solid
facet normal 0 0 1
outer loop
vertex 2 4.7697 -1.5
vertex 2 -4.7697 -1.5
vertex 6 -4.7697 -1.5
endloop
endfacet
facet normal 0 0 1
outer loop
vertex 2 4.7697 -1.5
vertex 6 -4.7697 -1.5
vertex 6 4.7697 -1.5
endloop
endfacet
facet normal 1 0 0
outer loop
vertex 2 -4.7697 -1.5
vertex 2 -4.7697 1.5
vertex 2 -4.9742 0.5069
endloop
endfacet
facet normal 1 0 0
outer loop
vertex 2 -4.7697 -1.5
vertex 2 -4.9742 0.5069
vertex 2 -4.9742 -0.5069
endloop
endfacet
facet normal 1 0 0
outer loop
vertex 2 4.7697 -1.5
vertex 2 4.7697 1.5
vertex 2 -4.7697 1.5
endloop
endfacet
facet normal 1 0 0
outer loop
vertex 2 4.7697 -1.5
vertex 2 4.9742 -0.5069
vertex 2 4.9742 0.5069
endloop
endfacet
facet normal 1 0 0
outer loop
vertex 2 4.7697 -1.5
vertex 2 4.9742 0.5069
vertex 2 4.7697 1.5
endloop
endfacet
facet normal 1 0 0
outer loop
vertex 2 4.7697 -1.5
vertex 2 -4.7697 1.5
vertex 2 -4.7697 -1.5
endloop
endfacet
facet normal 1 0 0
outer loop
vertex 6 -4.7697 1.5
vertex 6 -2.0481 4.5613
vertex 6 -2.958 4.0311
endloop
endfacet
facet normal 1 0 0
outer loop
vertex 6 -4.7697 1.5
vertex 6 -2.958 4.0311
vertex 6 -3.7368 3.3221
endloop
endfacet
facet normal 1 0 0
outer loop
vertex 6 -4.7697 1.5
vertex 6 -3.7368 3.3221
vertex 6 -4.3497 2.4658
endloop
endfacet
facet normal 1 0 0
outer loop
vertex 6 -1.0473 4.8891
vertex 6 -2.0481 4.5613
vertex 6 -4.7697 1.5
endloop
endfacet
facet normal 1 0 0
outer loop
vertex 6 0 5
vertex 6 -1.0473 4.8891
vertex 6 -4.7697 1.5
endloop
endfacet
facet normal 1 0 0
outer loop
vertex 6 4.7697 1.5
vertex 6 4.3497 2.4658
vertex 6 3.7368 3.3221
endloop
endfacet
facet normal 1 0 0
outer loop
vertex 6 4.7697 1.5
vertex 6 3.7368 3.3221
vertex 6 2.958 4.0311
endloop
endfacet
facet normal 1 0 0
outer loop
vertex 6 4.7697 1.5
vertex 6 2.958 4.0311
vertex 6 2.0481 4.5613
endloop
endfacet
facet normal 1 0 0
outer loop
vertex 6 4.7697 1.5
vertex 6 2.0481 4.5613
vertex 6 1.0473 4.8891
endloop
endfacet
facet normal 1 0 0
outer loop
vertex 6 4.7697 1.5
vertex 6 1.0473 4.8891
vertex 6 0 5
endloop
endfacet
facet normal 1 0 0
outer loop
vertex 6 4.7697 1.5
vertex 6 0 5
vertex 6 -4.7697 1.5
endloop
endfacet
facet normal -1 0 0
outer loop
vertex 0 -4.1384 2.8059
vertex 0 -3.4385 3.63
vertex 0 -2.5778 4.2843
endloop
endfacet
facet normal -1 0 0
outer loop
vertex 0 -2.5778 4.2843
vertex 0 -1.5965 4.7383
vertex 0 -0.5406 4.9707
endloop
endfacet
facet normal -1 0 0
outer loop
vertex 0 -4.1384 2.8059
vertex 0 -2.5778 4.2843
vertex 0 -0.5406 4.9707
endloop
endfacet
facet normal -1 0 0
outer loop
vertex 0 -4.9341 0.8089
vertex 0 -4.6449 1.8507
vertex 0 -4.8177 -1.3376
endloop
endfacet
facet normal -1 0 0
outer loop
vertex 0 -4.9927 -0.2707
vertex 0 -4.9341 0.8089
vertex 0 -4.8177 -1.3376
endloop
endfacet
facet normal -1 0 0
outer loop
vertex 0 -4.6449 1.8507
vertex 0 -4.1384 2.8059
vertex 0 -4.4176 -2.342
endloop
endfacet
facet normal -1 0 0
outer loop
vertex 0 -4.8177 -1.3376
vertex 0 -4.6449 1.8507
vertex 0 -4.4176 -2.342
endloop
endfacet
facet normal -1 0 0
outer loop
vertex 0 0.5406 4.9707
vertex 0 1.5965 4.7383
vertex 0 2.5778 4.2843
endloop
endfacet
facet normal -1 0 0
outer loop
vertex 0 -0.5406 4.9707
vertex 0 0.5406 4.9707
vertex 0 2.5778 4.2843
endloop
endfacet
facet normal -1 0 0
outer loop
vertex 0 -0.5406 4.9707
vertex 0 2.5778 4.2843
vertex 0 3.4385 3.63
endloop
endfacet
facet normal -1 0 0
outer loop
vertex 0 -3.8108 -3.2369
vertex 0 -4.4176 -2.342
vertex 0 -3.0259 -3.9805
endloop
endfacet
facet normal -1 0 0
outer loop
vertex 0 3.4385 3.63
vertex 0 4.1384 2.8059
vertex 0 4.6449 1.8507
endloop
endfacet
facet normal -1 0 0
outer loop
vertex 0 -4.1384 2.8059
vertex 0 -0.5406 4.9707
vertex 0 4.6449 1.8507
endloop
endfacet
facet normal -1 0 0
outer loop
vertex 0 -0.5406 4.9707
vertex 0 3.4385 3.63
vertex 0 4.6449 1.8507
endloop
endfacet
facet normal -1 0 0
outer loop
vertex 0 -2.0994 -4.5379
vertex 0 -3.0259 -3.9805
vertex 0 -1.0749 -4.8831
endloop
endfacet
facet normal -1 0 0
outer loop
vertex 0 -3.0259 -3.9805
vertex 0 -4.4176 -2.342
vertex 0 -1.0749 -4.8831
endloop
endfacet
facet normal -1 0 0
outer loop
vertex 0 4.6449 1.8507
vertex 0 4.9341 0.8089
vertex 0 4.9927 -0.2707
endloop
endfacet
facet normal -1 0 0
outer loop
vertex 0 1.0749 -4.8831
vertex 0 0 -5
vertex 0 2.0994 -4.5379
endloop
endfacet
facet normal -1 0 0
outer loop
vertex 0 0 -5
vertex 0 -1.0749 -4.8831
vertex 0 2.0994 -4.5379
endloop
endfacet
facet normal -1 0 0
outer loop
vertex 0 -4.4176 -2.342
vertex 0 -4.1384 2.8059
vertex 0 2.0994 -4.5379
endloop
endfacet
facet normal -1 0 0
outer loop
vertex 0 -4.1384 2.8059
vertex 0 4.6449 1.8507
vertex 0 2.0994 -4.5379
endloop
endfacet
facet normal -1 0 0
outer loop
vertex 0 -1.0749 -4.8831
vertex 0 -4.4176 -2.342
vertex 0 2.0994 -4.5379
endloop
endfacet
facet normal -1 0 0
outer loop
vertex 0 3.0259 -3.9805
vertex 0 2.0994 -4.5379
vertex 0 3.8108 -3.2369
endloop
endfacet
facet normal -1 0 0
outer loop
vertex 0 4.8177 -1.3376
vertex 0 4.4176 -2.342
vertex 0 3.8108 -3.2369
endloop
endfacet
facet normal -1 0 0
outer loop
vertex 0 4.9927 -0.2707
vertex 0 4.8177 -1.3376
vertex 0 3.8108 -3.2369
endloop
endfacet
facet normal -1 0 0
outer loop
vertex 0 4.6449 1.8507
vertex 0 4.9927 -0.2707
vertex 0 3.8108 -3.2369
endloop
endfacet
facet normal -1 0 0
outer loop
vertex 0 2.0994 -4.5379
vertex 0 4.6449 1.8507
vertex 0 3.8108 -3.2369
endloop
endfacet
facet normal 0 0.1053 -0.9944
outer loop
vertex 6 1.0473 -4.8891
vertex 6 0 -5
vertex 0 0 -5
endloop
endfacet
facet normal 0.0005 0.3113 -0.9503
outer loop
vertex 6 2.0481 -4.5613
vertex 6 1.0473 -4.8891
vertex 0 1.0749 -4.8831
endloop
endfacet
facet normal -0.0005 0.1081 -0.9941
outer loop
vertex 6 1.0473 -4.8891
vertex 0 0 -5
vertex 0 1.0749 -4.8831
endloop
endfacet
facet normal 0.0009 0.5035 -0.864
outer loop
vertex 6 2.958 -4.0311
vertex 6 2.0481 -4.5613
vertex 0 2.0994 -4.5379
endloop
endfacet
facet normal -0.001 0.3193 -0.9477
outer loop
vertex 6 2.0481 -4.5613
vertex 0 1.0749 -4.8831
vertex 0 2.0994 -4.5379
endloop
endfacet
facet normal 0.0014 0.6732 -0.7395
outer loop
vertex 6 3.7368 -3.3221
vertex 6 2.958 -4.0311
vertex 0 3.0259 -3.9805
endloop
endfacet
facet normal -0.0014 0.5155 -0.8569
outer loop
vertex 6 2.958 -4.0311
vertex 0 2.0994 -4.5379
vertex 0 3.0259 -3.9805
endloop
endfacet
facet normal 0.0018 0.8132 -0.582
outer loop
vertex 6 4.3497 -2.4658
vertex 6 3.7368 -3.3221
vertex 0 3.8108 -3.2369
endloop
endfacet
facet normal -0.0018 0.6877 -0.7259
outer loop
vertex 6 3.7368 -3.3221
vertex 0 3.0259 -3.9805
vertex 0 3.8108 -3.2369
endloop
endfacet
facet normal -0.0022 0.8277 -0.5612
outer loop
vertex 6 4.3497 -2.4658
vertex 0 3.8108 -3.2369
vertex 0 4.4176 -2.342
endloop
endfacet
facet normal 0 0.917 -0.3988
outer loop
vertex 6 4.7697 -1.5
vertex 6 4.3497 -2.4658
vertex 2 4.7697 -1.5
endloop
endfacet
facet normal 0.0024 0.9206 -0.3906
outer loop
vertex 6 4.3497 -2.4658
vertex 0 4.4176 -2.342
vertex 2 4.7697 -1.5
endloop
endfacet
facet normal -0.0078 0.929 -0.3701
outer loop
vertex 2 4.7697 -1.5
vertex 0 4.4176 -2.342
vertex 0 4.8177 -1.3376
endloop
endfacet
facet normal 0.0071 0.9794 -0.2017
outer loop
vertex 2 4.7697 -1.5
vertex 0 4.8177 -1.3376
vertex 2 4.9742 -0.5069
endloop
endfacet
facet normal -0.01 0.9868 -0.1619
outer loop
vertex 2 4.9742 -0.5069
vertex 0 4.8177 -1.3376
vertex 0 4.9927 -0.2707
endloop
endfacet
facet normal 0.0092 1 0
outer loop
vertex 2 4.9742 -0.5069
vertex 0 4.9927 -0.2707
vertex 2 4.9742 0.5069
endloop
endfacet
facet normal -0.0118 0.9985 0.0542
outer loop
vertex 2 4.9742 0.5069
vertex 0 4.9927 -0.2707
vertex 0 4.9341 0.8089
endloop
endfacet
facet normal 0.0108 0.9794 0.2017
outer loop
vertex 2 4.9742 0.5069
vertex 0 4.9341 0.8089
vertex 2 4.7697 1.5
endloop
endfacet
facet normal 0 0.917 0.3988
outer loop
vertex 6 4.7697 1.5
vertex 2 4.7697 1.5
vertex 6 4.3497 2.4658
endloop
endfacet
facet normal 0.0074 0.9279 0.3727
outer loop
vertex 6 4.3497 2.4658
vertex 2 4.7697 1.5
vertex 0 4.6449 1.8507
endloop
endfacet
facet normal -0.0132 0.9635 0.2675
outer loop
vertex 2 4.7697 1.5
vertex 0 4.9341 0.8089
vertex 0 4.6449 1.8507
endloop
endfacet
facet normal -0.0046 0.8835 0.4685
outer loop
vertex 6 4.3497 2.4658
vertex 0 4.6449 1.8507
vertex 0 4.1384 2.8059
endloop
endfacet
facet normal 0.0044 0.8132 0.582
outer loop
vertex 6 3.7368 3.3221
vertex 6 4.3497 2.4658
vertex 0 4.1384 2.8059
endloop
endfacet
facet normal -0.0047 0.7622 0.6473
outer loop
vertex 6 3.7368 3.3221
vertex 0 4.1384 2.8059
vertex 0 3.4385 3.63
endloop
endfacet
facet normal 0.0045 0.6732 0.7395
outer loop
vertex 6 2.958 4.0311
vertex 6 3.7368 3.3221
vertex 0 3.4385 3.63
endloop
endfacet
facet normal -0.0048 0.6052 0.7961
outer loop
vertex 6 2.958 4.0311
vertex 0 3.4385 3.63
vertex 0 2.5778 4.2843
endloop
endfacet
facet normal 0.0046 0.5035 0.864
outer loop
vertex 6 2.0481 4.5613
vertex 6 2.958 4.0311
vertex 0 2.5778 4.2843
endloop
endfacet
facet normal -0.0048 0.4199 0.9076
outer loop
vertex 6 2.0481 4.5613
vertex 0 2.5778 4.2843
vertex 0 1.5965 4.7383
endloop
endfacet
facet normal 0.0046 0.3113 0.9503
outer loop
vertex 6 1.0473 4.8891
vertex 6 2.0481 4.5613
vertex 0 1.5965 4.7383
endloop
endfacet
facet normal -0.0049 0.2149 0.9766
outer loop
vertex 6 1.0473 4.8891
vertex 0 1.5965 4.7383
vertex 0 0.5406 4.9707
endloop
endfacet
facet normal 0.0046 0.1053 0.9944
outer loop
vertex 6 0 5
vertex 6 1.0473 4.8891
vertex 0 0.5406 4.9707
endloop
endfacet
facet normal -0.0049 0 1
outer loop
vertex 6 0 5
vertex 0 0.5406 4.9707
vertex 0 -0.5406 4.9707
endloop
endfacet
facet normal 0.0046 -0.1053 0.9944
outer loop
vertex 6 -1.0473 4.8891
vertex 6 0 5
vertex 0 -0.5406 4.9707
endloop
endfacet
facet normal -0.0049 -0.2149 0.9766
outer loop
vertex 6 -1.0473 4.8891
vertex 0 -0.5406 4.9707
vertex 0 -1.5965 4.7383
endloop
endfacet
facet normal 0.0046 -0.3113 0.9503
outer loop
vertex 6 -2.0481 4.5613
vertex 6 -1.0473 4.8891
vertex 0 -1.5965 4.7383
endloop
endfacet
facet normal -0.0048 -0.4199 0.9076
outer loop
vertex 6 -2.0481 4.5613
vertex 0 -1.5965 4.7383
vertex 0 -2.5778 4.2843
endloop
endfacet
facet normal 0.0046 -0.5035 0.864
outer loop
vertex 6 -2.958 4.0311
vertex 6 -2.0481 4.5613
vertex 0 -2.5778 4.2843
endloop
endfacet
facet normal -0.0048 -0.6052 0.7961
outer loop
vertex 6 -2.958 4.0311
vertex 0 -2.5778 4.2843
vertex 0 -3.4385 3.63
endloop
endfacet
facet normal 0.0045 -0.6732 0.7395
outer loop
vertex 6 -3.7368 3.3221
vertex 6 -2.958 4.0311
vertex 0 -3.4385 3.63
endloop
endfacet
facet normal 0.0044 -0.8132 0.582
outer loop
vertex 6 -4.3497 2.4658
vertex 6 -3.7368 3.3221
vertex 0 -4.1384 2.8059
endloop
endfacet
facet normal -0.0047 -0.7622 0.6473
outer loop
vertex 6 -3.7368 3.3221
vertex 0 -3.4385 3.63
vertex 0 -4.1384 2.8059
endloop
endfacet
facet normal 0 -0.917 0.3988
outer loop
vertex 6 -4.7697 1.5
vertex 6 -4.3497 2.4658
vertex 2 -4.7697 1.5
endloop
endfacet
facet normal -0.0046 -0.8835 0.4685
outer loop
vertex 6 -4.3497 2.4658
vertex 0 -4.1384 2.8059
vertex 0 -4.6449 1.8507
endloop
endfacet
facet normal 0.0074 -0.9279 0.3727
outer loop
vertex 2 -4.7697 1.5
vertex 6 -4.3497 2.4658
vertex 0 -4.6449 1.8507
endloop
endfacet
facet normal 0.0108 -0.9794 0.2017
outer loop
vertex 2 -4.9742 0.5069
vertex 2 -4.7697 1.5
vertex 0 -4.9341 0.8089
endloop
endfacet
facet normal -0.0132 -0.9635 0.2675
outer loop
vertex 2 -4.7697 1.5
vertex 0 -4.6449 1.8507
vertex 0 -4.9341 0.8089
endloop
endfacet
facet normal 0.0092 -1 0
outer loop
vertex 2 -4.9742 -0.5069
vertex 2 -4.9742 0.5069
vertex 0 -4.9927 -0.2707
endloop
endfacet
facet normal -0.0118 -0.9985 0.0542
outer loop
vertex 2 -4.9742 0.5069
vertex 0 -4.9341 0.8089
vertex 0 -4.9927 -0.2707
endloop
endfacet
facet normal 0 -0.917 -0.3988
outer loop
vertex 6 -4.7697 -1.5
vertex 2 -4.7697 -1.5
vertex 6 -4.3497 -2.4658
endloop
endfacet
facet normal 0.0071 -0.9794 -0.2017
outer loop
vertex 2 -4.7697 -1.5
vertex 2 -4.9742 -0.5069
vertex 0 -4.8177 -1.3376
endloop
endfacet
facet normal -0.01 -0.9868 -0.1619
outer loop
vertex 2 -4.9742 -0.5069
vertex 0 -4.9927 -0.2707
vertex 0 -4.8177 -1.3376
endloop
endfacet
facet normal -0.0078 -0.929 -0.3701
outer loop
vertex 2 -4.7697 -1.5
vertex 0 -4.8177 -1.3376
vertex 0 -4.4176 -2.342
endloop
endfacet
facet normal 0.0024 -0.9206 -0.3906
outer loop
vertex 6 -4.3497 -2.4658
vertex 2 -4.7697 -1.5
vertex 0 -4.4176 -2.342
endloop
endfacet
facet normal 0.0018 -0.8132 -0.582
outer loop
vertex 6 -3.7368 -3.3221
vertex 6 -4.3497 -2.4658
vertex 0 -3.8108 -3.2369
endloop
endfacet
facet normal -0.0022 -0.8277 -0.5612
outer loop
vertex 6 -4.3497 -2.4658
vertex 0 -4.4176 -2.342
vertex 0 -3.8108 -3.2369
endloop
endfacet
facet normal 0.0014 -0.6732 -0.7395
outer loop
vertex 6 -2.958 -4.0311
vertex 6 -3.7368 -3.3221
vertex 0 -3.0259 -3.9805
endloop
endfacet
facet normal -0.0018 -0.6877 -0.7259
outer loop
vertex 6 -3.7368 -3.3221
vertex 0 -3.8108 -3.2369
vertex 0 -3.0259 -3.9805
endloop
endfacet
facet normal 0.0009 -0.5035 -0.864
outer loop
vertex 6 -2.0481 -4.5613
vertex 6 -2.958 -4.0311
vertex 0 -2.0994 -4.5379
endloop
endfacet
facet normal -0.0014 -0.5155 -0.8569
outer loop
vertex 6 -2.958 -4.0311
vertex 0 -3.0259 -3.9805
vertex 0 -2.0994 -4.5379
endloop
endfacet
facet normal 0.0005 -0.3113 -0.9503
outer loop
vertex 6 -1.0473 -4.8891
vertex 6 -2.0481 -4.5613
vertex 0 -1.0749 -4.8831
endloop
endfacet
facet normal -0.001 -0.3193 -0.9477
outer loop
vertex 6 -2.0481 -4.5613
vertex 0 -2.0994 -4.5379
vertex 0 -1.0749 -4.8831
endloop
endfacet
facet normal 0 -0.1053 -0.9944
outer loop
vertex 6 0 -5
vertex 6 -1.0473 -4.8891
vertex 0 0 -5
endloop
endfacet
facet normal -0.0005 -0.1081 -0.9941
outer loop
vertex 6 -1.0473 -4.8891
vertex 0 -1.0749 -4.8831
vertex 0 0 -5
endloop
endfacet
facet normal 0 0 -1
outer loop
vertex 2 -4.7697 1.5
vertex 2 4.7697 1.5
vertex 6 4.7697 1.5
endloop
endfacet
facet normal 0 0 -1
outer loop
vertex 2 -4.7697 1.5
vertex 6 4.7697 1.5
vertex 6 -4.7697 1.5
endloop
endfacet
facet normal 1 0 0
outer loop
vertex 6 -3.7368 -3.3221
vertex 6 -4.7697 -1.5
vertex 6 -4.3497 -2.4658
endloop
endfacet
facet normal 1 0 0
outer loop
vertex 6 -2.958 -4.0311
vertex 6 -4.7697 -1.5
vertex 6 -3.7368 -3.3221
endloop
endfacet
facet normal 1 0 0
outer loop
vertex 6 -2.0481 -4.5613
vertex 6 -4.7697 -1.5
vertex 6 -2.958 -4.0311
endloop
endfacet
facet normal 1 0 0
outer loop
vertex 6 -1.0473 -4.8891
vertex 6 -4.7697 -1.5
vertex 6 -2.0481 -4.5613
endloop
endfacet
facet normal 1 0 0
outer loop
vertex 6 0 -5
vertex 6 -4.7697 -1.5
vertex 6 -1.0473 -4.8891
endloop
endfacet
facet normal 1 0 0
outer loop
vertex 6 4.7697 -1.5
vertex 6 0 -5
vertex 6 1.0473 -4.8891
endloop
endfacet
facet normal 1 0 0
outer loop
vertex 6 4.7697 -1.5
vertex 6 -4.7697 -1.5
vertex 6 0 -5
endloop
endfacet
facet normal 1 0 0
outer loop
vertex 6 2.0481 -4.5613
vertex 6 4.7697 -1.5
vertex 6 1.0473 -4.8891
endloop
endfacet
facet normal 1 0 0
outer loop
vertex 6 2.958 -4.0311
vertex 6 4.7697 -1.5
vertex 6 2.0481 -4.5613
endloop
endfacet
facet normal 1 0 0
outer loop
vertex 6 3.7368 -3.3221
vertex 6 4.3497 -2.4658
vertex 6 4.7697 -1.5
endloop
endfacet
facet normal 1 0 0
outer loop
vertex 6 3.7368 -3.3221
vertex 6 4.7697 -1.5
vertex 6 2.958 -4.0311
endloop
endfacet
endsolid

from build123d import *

# Parameters (mm, degrees)
SKETCH2_R           = 5
BOSS_EXTRUDE1_DEPTH = 6
CUT_EXTRUDE1_START  = -4
CUT_EXTRUDE1_DEPTH  = 4


with BuildPart() as part:
    # Sketch2 → Boss-Extrude1 (new body)
    with BuildSketch(Plane(origin=(0, 0, 0), x_dir=(0, 0, -1), z_dir=(1, 0, 0))):
        Circle(SKETCH2_R)
    extrude(amount=BOSS_EXTRUDE1_DEPTH)

    # Sketch3 → Cut-Extrude1 (cut)
    with BuildSketch(Plane(origin=(6, 0, 0), x_dir=(0, 0, -1), z_dir=(1, 0, 0)).offset(CUT_EXTRUDE1_START)):
        with BuildLine():
            Line((-1.5, 4.769696007), (-1.5, -4.769696007))
            ThreePointArc((-1.5, -4.769696007), (0, -5), (1.5, -4.769696007))
            Line((1.5, -4.769696007), (1.5, 4.769696007))
            ThreePointArc((1.5, 4.769696007), (0, 5), (-1.5, 4.769696007))
        make_face()
    extrude(amount=CUT_EXTRUDE1_DEPTH, mode=Mode.SUBTRACT)


solid = part.part
